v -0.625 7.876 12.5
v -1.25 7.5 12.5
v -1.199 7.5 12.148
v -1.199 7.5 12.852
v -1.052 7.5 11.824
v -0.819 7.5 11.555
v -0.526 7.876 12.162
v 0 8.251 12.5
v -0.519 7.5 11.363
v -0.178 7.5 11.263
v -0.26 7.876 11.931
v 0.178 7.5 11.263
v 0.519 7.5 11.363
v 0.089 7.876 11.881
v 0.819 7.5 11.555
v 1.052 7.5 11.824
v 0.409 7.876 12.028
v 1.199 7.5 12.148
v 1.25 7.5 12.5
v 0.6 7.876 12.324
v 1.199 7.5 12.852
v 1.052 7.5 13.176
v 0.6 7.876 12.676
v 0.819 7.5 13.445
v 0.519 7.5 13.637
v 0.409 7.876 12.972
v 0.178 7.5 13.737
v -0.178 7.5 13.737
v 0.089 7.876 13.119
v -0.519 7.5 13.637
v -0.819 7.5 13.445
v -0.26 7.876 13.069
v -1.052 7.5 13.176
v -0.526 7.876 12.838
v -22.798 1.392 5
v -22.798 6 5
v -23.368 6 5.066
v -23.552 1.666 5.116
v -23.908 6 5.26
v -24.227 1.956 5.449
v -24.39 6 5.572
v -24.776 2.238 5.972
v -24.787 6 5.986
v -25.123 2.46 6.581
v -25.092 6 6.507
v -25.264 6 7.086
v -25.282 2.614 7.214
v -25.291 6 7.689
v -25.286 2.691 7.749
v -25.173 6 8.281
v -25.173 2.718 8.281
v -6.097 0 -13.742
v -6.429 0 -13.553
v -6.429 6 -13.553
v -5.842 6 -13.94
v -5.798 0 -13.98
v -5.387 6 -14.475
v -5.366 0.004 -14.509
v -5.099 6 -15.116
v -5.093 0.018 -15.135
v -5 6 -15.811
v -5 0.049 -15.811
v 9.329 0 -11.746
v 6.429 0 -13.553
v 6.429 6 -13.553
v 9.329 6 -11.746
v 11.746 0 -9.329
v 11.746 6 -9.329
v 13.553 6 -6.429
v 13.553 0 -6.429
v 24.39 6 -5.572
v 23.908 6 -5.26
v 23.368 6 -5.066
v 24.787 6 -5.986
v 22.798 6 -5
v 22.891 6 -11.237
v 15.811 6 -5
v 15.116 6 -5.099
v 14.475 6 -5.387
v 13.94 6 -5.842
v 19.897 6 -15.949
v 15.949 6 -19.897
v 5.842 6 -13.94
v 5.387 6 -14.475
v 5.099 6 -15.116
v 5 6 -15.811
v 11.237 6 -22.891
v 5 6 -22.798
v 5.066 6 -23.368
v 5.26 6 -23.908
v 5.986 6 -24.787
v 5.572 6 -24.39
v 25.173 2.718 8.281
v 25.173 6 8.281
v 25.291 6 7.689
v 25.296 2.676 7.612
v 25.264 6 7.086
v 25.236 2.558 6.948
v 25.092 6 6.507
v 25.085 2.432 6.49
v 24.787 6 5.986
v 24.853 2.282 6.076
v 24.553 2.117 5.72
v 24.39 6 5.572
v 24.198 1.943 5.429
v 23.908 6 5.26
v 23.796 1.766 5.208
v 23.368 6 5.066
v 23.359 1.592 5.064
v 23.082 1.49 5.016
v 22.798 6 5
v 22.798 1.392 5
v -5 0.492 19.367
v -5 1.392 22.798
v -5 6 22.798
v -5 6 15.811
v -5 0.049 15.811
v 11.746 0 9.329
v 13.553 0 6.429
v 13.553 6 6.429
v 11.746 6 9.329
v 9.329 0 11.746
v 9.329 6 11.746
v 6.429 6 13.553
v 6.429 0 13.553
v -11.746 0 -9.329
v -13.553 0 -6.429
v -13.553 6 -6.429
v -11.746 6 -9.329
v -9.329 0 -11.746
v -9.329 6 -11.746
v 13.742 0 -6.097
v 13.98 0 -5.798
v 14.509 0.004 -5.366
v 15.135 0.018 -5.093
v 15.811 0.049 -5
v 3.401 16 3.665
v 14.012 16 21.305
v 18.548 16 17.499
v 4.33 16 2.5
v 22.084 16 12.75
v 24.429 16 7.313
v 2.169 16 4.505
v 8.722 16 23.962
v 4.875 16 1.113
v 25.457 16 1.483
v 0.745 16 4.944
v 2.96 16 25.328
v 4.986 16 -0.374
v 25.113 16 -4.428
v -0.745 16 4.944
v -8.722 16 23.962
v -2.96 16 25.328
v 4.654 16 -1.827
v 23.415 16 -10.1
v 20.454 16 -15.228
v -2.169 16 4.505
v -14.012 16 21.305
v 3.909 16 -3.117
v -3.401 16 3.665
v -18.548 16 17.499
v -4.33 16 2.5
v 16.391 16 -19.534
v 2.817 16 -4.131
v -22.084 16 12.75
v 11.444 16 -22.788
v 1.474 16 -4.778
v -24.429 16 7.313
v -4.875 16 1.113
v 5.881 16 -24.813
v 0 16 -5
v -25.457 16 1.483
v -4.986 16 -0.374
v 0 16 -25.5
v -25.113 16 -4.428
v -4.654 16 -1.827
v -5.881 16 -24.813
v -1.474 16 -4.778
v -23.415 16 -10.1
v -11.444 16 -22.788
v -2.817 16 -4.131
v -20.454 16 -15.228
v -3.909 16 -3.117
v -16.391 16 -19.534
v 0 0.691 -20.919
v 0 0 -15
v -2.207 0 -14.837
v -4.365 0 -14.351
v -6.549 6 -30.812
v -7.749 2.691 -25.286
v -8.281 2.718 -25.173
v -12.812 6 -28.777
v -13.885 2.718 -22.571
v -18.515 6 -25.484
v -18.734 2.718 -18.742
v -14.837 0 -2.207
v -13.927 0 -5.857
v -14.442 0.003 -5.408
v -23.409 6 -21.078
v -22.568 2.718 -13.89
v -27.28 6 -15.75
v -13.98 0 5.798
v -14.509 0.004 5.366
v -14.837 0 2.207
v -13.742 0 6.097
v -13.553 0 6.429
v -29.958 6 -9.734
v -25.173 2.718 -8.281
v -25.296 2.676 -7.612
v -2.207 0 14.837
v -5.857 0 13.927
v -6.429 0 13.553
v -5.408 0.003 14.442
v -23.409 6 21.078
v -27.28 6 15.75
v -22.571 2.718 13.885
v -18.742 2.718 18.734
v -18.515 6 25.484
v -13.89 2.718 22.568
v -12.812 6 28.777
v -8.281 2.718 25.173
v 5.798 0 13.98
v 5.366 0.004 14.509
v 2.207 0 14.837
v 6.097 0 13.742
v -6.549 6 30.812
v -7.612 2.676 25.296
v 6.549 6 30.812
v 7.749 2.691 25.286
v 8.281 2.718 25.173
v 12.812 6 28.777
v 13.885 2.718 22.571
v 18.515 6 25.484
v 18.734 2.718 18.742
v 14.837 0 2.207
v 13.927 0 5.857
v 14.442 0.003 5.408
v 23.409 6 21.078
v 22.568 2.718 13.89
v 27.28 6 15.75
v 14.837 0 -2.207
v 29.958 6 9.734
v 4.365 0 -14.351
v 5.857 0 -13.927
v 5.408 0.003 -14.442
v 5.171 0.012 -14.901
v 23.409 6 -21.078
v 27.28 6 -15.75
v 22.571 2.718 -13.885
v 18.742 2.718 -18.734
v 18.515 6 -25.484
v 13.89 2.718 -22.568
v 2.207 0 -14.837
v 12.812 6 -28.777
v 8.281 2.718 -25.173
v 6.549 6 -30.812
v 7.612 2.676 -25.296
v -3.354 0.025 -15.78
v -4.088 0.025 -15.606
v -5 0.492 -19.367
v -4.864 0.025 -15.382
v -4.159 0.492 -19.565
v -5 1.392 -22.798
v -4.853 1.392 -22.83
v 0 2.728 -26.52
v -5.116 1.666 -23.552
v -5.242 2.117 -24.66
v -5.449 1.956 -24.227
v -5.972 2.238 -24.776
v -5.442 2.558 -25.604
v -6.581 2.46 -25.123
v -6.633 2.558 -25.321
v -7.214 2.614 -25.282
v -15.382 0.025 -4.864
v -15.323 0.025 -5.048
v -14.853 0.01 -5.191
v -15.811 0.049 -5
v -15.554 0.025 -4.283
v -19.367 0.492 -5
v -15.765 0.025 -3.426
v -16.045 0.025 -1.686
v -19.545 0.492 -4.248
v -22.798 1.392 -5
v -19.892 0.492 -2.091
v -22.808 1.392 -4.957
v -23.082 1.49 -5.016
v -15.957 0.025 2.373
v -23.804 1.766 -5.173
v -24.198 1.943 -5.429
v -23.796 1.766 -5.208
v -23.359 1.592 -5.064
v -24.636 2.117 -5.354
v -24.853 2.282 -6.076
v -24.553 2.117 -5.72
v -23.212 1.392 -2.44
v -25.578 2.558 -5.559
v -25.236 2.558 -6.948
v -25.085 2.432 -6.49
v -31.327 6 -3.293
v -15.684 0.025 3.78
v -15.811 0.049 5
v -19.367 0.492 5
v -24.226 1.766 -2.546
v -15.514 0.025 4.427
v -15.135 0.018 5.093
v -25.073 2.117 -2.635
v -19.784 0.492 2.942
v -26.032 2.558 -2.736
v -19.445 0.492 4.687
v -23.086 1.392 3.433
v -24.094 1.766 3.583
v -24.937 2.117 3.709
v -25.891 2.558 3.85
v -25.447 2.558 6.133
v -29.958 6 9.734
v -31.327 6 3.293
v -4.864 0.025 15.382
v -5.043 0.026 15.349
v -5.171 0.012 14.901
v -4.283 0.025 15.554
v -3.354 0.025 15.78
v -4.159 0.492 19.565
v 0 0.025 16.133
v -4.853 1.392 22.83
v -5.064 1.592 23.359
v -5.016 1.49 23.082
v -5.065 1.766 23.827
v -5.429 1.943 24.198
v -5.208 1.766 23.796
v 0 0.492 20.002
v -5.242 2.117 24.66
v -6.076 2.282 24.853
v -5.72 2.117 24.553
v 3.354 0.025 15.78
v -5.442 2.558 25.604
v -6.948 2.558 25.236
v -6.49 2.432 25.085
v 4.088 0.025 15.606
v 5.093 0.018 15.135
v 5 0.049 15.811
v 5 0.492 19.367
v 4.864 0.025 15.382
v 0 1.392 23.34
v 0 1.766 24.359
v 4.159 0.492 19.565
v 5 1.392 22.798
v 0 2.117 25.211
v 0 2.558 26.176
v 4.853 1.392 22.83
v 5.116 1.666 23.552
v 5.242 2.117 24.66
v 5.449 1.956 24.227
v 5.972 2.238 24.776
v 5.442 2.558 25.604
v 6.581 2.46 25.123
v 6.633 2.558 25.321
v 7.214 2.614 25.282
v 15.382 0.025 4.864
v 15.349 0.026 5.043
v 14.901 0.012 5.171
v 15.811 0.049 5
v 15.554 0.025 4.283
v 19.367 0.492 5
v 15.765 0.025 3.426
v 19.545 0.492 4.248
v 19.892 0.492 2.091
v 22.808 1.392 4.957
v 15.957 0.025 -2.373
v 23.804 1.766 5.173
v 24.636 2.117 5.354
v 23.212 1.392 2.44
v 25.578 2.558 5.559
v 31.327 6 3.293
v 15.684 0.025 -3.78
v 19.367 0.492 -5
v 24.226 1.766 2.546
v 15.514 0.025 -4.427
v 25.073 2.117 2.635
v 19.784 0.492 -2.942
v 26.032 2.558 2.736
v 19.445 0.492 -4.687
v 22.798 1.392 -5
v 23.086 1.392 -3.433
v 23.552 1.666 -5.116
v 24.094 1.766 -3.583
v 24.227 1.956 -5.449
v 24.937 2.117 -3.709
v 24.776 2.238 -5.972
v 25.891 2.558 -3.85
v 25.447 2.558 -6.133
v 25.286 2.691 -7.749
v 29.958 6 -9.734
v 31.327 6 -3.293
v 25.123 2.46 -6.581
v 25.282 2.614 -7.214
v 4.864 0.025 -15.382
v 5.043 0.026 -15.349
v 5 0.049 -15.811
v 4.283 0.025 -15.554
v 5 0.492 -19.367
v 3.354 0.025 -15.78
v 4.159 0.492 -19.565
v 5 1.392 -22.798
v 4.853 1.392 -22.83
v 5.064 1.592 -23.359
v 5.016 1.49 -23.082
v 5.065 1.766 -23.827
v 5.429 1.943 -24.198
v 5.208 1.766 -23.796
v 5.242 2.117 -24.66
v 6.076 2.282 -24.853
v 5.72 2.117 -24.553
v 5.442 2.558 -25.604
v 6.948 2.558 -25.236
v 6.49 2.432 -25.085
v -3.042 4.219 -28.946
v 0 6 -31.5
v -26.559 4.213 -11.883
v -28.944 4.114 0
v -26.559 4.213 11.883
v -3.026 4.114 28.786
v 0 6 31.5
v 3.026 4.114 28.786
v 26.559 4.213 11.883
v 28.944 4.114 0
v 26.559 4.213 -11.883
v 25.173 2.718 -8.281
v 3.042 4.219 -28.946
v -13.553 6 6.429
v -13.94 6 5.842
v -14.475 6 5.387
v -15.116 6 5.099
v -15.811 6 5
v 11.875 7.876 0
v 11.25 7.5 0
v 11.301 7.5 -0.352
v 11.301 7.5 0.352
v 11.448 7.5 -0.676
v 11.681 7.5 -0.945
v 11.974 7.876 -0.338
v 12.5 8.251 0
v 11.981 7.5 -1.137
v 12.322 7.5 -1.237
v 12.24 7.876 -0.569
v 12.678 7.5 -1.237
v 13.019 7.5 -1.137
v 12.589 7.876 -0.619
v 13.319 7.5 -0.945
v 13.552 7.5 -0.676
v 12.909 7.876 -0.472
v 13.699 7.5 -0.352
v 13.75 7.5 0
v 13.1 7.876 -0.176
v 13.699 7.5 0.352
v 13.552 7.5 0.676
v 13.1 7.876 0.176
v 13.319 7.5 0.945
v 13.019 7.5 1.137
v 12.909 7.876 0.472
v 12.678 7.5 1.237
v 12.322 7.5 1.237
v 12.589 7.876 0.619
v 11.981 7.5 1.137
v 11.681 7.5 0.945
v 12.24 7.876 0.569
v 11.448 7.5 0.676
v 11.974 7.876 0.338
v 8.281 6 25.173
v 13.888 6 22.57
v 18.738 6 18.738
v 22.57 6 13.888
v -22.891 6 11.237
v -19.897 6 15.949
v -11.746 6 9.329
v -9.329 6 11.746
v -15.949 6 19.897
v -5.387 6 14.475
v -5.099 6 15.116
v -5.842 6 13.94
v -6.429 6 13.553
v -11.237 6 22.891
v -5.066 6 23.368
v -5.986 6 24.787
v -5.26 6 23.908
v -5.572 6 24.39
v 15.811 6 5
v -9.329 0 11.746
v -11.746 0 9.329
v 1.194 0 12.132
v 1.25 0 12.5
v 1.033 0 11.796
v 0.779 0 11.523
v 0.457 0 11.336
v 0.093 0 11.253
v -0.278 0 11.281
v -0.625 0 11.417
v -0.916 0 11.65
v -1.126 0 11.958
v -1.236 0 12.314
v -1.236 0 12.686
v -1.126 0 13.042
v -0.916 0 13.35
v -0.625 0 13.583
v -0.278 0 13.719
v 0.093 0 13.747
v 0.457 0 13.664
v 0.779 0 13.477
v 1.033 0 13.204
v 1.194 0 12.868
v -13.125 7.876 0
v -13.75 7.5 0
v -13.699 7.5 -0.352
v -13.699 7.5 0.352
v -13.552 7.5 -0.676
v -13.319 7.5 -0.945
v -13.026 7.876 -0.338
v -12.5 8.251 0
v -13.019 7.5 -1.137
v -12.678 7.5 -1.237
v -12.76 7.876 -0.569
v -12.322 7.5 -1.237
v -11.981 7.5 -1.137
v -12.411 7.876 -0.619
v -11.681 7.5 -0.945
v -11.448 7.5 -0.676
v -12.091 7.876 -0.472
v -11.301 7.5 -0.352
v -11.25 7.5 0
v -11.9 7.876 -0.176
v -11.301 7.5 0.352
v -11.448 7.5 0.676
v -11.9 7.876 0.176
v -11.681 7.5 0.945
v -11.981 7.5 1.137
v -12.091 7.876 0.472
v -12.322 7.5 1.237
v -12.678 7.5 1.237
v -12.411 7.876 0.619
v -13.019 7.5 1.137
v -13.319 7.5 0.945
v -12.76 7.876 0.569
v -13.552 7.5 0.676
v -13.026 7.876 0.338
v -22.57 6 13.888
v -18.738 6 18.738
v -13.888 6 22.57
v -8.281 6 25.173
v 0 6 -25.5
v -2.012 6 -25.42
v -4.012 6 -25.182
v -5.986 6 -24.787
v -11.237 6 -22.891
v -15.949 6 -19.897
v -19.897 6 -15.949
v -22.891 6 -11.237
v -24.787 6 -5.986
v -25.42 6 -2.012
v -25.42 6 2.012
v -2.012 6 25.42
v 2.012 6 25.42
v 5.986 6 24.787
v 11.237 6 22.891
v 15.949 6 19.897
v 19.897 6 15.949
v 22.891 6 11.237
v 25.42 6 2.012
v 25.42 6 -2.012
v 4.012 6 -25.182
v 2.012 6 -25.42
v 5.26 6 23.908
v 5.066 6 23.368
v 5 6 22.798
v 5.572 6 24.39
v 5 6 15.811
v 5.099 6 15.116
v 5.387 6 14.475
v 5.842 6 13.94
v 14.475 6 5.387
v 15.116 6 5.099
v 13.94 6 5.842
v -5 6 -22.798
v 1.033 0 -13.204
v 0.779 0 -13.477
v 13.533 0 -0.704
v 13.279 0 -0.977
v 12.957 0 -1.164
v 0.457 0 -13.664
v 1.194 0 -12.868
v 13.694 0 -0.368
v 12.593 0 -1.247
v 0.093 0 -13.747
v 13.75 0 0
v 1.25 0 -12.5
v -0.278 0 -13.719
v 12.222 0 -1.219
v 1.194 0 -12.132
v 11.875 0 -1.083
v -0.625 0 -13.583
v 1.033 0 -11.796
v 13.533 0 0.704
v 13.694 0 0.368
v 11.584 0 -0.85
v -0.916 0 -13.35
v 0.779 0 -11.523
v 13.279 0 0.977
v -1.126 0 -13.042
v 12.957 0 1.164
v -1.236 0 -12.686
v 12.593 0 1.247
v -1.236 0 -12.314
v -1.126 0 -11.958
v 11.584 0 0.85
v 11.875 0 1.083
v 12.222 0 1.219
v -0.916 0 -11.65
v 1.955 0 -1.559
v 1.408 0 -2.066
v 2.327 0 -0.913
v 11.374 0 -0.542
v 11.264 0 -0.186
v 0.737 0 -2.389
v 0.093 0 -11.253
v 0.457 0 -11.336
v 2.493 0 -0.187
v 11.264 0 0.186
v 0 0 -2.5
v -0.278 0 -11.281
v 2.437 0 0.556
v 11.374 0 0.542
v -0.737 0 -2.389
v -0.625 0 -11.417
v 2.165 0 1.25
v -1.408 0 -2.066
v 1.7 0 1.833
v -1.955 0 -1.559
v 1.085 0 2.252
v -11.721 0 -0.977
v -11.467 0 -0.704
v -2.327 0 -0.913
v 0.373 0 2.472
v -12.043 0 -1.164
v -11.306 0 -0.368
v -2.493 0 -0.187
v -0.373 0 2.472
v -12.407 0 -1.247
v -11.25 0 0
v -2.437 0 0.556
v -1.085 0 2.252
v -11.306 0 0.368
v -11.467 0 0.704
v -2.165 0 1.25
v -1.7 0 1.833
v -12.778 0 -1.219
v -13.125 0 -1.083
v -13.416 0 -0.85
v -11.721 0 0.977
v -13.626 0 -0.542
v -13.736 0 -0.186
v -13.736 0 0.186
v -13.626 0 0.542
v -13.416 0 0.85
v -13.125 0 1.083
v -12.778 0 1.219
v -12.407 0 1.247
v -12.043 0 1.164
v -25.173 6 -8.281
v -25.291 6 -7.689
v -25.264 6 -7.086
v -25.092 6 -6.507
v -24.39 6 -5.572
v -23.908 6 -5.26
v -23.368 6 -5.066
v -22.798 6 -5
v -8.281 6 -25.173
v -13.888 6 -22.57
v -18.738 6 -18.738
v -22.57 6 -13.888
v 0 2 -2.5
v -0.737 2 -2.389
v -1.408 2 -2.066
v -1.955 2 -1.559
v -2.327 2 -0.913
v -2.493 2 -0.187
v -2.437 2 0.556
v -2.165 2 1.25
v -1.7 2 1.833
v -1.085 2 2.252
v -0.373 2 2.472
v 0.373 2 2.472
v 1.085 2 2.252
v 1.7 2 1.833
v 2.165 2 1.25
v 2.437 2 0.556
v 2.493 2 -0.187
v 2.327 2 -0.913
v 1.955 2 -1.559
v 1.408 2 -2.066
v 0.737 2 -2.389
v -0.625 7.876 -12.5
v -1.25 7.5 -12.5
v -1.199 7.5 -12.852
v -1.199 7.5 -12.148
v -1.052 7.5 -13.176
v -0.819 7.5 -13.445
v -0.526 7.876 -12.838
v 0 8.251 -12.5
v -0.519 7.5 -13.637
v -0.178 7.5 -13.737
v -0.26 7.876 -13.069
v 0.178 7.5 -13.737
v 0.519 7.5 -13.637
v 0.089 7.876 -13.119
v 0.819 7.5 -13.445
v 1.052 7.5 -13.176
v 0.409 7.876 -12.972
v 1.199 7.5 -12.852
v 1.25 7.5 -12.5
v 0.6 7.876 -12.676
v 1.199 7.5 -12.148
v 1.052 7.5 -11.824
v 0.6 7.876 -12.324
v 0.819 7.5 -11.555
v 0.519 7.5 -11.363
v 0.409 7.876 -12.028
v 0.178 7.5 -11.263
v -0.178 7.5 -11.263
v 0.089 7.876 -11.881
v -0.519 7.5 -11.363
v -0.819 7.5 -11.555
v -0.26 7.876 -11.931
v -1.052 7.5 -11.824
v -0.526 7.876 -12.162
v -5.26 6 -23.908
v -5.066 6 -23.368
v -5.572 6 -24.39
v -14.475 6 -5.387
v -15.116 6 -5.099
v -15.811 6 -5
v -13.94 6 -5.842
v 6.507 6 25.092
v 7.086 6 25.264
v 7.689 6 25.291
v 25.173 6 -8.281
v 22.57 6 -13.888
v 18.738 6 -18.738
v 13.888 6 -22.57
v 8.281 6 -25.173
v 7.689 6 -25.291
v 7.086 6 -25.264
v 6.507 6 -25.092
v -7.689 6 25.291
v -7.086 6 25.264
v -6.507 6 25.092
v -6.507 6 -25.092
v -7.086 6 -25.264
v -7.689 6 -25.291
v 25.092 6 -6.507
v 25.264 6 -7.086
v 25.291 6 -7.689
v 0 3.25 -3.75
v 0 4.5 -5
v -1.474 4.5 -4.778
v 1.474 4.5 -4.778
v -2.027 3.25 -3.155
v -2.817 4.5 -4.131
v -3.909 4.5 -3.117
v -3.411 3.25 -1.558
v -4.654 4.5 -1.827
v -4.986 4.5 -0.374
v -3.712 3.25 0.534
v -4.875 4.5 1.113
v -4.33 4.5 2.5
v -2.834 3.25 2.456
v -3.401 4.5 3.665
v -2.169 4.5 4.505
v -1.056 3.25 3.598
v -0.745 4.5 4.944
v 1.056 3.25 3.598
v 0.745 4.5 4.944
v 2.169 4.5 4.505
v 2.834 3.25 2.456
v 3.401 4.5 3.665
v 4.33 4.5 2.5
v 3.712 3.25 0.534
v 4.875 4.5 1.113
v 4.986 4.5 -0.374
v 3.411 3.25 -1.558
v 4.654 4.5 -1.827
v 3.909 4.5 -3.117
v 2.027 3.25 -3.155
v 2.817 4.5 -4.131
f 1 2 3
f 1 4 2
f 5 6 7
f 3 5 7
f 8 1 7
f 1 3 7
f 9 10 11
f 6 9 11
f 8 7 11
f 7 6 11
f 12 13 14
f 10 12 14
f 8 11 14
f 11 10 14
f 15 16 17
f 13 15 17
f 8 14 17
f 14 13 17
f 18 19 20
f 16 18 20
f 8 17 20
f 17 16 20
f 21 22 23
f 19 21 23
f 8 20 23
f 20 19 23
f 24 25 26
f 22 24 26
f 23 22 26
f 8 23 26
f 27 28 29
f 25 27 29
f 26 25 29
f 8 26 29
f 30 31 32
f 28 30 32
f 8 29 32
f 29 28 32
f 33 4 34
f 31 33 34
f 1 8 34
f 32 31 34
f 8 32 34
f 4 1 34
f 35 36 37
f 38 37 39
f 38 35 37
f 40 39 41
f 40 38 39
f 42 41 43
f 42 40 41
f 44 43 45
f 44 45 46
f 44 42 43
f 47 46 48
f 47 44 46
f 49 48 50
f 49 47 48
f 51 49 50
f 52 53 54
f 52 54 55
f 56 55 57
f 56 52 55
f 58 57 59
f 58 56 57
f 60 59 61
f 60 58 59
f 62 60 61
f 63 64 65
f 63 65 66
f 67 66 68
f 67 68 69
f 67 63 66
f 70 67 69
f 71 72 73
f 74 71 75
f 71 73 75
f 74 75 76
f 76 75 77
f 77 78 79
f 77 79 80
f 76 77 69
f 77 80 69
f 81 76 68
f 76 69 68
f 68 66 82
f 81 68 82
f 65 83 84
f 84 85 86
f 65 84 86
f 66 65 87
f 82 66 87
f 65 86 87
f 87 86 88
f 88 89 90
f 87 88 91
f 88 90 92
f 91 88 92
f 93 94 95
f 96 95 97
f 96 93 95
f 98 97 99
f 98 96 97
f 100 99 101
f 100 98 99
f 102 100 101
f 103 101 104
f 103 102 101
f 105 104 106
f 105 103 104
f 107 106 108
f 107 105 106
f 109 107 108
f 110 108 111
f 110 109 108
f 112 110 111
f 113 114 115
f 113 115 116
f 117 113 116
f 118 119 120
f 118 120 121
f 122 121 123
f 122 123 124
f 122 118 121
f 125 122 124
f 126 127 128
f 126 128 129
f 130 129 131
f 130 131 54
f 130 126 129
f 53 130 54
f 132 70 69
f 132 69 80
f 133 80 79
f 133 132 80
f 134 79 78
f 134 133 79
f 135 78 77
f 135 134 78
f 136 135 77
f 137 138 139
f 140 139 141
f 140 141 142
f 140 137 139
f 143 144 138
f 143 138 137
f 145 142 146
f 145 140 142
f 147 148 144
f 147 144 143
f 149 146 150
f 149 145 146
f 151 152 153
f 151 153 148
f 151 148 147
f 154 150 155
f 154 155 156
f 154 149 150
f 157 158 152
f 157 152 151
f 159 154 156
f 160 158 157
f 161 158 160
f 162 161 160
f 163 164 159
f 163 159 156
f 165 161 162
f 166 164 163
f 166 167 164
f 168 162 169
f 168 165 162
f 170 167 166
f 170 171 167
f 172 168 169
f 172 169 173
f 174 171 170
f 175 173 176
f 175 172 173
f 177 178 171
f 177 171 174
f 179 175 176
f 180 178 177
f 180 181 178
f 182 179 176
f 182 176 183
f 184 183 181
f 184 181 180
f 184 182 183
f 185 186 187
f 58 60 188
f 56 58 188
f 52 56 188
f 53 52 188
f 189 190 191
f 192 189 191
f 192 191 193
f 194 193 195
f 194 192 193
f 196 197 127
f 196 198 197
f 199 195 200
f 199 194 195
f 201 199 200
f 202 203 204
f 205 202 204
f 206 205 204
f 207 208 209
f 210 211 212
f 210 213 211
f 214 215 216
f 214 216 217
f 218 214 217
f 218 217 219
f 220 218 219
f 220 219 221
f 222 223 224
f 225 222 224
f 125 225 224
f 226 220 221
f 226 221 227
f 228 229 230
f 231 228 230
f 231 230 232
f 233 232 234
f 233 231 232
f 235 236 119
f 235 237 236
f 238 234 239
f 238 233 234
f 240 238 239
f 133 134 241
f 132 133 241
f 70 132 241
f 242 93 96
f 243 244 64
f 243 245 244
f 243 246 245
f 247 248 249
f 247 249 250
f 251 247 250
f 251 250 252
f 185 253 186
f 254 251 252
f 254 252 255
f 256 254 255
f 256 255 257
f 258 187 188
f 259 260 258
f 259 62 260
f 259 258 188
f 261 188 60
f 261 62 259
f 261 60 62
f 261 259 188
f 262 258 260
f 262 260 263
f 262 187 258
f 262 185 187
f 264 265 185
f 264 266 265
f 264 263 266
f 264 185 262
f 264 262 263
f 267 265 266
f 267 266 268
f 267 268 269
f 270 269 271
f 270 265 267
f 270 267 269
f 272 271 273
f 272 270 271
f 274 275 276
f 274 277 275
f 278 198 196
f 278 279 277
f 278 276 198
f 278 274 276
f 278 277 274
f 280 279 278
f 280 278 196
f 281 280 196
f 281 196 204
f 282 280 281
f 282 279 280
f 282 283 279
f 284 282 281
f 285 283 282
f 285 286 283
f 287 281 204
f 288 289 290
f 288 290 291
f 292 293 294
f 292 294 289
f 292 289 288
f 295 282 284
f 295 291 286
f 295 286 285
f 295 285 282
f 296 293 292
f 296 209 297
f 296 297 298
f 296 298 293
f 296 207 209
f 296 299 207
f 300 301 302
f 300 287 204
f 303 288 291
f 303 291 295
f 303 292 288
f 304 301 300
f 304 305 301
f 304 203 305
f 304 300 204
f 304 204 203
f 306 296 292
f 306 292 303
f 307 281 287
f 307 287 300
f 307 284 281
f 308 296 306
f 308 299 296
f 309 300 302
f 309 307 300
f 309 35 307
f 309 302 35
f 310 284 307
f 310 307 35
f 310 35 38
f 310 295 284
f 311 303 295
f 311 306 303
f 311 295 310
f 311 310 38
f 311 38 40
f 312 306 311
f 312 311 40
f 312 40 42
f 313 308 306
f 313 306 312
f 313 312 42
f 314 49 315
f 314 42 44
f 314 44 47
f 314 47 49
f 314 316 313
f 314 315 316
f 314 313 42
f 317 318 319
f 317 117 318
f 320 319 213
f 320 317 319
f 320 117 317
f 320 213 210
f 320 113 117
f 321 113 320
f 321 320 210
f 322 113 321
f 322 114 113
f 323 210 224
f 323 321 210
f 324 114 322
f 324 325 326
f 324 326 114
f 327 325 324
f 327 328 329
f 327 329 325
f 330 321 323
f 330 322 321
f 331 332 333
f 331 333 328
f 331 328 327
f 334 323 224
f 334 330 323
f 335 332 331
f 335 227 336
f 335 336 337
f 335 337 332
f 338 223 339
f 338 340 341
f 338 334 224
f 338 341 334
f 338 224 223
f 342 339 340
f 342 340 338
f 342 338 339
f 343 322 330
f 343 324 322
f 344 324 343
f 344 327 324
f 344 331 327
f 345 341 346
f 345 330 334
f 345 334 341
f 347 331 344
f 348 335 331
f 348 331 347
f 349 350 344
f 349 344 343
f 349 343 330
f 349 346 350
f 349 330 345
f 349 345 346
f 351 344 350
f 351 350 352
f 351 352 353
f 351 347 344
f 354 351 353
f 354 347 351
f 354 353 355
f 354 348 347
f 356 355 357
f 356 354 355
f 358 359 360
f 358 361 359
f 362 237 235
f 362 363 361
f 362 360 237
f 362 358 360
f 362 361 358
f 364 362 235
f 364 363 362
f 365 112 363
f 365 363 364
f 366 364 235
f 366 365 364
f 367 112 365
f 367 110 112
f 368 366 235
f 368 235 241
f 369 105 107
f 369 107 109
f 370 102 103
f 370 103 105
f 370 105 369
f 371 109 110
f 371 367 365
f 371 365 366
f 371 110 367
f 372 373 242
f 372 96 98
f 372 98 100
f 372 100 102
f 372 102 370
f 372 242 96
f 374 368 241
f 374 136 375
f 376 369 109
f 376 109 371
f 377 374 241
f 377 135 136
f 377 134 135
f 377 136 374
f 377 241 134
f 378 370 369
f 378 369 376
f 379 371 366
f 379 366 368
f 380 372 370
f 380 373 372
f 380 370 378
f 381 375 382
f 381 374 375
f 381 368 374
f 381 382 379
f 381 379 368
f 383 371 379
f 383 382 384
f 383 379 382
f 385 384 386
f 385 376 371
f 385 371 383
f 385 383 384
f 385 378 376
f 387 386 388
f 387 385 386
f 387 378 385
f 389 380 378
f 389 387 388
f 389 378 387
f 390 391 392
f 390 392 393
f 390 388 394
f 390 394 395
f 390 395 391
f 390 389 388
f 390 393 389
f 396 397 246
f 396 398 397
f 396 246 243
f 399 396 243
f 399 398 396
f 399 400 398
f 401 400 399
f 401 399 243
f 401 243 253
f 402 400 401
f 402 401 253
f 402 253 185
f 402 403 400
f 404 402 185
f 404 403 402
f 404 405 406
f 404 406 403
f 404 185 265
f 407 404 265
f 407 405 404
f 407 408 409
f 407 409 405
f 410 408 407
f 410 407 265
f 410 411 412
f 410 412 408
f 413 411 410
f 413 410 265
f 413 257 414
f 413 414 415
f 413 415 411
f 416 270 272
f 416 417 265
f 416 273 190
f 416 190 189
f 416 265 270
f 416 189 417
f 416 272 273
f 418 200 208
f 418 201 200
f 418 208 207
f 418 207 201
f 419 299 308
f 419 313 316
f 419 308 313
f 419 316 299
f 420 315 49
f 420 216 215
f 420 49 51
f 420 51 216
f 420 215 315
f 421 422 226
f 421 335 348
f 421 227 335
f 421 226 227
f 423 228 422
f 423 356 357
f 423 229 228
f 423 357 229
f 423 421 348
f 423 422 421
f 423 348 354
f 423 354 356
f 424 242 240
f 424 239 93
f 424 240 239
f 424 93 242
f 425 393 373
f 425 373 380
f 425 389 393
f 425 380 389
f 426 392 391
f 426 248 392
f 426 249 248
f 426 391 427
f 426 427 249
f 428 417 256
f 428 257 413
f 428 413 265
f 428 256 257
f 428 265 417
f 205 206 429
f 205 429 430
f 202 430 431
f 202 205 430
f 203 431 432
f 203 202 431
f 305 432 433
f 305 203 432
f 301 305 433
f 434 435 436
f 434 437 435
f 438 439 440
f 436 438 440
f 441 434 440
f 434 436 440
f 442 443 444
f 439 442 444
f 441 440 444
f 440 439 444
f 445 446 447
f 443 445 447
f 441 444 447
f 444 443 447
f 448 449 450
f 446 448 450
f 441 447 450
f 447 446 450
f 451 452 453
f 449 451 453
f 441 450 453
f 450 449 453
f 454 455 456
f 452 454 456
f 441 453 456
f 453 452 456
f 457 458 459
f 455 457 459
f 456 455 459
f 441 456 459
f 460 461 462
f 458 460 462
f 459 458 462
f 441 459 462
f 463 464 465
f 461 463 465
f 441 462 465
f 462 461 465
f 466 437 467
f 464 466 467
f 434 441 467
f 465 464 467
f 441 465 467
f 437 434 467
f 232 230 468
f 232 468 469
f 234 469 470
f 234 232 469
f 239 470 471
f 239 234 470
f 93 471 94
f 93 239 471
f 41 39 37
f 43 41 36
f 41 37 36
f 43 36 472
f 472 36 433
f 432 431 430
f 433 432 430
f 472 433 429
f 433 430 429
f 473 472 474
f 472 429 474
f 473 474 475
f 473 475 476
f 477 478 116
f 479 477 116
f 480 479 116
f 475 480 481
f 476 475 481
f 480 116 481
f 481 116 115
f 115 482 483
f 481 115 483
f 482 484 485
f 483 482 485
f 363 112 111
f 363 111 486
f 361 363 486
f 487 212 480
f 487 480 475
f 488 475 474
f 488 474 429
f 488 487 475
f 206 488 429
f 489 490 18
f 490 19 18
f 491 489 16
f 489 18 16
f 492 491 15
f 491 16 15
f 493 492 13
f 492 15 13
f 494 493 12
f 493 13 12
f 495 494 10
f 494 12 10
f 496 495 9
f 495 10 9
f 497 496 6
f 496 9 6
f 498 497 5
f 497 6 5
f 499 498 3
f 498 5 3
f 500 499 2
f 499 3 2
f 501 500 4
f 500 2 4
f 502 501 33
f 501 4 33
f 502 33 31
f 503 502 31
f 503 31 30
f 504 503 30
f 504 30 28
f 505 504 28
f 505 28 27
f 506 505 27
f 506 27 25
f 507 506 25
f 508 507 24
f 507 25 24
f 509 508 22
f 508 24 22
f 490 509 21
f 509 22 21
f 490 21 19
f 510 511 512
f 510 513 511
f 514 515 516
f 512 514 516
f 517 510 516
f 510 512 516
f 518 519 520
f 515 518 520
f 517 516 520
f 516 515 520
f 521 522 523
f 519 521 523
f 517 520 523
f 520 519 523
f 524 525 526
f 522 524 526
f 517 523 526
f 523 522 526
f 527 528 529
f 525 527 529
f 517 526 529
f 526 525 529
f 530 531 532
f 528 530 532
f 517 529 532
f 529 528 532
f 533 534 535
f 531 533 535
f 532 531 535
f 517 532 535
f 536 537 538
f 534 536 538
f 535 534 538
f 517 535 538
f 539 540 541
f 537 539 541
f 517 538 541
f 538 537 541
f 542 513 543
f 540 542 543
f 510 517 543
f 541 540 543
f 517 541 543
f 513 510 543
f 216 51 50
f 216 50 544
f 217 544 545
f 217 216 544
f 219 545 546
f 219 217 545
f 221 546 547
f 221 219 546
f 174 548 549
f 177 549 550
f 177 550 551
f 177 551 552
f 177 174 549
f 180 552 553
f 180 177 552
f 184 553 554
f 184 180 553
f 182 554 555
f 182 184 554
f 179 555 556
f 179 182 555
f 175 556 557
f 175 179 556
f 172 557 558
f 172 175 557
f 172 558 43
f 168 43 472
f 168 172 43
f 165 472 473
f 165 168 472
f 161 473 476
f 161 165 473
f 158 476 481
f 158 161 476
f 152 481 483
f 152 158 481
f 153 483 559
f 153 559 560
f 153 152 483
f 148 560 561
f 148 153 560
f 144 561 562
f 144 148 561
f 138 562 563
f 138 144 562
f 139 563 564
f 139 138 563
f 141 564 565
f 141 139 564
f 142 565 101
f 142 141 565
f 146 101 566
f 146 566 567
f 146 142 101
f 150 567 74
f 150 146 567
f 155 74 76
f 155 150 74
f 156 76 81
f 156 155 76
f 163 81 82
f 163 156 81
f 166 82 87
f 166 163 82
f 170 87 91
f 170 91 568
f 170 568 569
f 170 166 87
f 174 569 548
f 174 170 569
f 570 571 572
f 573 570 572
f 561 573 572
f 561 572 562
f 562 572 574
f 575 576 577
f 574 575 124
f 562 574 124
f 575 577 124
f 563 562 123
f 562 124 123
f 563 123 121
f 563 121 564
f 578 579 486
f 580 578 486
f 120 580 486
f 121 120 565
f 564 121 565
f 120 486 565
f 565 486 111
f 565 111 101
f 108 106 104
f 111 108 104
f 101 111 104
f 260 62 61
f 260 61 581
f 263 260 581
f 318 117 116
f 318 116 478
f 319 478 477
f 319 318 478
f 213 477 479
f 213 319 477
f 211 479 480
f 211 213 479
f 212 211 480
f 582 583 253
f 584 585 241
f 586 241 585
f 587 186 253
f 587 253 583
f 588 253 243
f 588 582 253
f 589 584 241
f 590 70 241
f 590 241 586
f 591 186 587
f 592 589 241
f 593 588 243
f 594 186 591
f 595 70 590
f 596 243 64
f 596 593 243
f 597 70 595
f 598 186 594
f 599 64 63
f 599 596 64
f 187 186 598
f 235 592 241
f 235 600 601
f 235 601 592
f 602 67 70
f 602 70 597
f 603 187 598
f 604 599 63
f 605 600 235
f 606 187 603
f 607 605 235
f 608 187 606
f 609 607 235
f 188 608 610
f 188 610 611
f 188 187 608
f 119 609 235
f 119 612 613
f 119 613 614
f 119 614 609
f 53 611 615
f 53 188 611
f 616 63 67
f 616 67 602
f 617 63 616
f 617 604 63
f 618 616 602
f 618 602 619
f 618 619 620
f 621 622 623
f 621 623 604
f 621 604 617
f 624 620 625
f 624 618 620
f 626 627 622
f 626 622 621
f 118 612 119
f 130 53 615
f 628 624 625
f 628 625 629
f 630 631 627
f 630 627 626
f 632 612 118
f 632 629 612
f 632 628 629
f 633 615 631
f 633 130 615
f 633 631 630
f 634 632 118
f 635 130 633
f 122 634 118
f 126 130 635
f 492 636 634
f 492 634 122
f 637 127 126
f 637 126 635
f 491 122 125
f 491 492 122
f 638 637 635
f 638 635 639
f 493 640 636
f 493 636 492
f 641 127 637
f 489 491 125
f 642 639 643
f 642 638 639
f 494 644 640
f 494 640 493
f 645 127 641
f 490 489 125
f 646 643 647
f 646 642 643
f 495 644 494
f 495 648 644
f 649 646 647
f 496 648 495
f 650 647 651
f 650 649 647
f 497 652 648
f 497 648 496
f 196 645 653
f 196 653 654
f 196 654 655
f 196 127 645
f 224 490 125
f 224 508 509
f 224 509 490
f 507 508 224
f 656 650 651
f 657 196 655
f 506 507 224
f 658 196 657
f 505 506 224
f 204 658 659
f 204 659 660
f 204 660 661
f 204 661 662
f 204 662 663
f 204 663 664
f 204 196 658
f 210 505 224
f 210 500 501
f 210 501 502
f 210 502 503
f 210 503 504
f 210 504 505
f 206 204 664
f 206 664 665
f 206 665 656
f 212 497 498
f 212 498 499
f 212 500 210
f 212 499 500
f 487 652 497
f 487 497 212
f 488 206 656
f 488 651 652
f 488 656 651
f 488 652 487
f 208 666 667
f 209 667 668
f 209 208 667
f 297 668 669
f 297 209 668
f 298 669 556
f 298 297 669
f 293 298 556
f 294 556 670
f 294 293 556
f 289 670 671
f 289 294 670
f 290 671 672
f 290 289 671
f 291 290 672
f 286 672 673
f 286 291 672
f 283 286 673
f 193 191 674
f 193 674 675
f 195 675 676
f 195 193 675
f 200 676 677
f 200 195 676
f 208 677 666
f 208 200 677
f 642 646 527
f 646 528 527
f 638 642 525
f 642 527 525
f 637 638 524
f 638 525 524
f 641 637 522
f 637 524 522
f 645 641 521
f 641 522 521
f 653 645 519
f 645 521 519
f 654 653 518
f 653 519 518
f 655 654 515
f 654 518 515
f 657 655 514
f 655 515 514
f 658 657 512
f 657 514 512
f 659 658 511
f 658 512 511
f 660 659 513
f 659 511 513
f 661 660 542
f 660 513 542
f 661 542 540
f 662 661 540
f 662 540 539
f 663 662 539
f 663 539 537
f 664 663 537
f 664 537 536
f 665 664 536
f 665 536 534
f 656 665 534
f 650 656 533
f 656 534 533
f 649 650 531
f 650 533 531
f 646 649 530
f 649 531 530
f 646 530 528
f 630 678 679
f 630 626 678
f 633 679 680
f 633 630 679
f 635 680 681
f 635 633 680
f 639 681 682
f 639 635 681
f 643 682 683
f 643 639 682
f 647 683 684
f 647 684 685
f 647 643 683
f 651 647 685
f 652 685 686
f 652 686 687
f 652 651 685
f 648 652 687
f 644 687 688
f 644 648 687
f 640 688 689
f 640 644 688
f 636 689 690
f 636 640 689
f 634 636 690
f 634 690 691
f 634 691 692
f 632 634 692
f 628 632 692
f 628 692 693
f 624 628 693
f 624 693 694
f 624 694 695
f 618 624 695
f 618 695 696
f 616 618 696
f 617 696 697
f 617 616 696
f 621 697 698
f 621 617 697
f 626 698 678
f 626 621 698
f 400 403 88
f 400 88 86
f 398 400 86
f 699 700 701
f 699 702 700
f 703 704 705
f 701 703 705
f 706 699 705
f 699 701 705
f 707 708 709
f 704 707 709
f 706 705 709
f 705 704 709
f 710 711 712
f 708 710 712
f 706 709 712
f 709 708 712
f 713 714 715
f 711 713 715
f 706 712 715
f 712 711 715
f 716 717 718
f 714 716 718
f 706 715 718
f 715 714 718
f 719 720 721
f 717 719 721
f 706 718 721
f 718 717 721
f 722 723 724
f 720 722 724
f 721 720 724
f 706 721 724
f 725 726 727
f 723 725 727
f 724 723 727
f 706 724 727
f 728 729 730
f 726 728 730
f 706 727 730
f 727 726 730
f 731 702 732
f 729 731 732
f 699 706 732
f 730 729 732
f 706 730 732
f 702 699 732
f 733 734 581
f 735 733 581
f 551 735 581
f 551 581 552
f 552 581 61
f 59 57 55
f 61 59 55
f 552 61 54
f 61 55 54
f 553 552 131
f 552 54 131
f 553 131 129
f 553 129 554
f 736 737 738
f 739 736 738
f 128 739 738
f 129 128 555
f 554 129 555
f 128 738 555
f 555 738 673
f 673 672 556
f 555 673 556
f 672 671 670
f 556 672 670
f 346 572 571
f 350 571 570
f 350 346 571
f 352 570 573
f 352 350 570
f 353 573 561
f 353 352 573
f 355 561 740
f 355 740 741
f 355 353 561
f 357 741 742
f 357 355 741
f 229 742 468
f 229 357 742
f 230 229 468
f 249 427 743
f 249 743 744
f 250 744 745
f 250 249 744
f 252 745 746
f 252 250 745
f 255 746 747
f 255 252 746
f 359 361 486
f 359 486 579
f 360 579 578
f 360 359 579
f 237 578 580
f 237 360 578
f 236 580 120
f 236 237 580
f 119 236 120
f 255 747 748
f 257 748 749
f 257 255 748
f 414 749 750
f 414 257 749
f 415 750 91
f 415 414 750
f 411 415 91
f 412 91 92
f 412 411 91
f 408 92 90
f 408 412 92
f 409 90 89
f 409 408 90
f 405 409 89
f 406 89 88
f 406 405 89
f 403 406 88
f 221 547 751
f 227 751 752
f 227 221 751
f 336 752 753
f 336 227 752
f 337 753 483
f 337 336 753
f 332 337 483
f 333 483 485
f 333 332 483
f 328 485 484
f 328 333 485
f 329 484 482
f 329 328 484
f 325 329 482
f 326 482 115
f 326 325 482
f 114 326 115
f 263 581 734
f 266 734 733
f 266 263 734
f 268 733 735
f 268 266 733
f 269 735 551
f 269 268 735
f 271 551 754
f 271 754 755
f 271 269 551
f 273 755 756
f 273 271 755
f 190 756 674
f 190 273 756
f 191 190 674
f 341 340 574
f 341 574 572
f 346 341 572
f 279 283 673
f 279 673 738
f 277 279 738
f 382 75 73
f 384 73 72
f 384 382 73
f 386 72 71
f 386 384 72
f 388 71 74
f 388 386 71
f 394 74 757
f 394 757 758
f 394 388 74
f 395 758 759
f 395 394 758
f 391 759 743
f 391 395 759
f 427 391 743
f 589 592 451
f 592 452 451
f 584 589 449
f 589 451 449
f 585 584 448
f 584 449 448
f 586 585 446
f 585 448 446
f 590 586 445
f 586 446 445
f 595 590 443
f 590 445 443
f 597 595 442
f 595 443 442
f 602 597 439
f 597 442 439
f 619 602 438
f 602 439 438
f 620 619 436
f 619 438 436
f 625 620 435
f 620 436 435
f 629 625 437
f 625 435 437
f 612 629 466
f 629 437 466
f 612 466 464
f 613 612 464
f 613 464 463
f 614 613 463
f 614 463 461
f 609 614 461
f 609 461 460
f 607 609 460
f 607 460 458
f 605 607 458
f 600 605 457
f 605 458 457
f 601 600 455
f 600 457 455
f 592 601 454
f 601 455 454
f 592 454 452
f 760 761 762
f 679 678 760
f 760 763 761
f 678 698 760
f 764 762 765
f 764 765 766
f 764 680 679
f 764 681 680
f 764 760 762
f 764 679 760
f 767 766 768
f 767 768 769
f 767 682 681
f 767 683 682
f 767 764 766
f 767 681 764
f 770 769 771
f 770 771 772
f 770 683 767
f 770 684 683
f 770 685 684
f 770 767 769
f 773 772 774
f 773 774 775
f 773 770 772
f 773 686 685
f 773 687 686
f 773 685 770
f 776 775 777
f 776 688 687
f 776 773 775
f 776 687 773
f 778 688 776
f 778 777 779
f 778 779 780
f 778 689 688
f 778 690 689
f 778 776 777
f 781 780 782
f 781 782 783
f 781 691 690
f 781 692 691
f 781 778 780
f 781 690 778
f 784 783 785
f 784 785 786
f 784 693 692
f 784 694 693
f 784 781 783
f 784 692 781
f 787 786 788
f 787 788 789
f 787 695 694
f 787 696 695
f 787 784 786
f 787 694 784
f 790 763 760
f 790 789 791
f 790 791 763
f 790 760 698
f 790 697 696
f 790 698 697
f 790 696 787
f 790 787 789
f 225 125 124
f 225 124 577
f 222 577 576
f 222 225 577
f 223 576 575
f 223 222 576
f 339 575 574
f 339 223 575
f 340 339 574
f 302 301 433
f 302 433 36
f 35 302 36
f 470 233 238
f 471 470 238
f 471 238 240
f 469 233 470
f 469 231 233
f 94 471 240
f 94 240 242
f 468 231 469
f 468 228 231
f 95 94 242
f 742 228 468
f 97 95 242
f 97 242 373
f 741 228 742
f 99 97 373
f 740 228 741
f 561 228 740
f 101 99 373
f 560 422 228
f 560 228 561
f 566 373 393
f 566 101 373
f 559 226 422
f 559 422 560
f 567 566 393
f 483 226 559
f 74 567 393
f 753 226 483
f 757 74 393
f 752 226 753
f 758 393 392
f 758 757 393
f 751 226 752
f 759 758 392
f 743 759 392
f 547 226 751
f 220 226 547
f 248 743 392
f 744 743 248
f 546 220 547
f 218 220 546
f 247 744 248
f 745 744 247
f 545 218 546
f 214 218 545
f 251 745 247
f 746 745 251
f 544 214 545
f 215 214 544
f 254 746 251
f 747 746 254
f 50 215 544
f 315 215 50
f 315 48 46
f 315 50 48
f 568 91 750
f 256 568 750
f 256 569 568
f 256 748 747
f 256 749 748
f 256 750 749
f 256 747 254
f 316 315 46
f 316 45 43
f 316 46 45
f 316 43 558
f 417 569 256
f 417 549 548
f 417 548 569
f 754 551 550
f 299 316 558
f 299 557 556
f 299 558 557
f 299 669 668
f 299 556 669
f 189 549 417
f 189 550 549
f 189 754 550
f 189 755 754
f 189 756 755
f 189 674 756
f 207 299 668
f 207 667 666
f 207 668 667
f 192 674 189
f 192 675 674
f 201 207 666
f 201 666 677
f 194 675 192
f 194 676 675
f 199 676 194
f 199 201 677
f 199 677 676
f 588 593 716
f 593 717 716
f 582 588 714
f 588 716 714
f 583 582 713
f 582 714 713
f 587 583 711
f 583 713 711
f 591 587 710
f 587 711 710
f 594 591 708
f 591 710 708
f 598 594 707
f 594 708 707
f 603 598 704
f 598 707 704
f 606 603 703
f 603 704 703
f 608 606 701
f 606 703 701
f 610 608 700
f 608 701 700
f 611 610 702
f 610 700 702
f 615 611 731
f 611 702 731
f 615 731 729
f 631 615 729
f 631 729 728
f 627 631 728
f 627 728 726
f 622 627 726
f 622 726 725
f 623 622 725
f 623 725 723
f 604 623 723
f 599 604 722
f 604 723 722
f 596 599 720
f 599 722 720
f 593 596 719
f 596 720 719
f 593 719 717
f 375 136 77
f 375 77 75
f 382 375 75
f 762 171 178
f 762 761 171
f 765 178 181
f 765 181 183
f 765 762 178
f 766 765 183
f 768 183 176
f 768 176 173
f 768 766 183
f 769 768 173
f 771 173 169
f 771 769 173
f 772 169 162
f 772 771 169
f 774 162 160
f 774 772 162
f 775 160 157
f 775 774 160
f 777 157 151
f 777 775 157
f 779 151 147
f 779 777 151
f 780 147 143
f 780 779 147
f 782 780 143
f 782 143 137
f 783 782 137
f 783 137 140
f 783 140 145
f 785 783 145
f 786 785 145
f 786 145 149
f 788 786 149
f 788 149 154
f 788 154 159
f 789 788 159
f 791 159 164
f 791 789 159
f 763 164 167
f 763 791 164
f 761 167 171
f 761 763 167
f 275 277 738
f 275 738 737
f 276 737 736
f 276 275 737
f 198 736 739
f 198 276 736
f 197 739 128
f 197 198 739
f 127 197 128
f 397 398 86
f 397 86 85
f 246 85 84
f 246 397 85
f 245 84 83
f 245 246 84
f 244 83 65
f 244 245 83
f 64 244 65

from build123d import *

# Parameters (mm, degrees)
M3X0_5_TAPPED_HOLE1_D     = 2.5
M3X0_5_TAPPED_HOLE1_DEPTH = 7.5
M3X0_5_TAPPED_HOLE1_TIP   = 0.751075774
CUT_EXTRUDE1_DEPTH        = 6
CIRPATTERN1_COUNT         = 4


with BuildPart() as part:
    # Sketch1 → Revolve1 (revolve)
    with BuildSketch(Plane.XY, mode=Mode.PRIVATE) as revolve1_sk:
        with BuildLine():
            Line((-2.5, 2), (-2.5, 0))
            Line((-2.5, 0), (-15, 0))
            ThreePointArc((-15, 0), (-23.778524933, 1.546556434), (-31.5, 6))
            Line((-31.5, 6), (-25.5, 6))
            Line((-25.5, 6), (-25.5, 16))
            Line((-25.5, 16), (-5, 16))
            Line((-5, 16), (-5, 4.5))
            Line((-5, 4.5), (-2.5, 2))
        make_face()
    revolve(revolve1_sk.sketch.rotate(Axis((0, 0, 0), (0, 1, 0)), 270), axis=Axis((0, 0, 0), (0, 1, 0)))

    # M3x0.5 Tapped Hole1
    with Locations(Plane(origin=(0, 0, 0), x_dir=(-1, 0, 0), z_dir=(0, -1, 0))):
        with Locations((12.5, 0), (-12.5, 0), (0, 12.5), (0, -12.5)):
            Hole(M3X0_5_TAPPED_HOLE1_D / 2, depth=M3X0_5_TAPPED_HOLE1_DEPTH)
            with Locations((0, 0, -(M3X0_5_TAPPED_HOLE1_DEPTH + M3X0_5_TAPPED_HOLE1_TIP / 2))):  # 118° drill point
                Cone(0, M3X0_5_TAPPED_HOLE1_D / 2, M3X0_5_TAPPED_HOLE1_TIP, mode=Mode.SUBTRACT)

    # Sketch4 → Cut-Extrude1 (cut)
    with BuildSketch(Plane.XZ):
        with BuildLine():
            Line((-5, -15.811388301), (-5, -22.79802623))
            ThreePointArc((-5, -22.79802623), (-6.034245075, -24.823257699), (-8.28125, -25.172820629))
            ThreePointArc((-8.28125, -25.172820629), (-18.738329701, -18.738329701), (-25.172820629, -8.28125))
            ThreePointArc((-25.172820629, -8.28125), (-24.823257699, -6.034245075), (-22.79802623, -5))
            Line((-22.79802623, -5), (-15.811388301, -5))
            ThreePointArc((-15.811388301, -5), (-14.475082091, -5.387114363), (-13.552618544, -6.428571429))
            ThreePointArc((-13.552618544, -6.428571429), (-10.606601718, -10.606601718), (-6.428571429, -13.552618544))
            ThreePointArc((-6.428571429, -13.552618544), (-5.387114363, -14.475082091), (-5, -15.811388301))
        make_face()
    cut_extrude1 = extrude(amount=-CUT_EXTRUDE1_DEPTH, mode=Mode.SUBTRACT)

    # CirPattern1: Cut-Extrude1 ×4 about axis
    cirpattern1_axis = Axis((0, 0, 0), (0, 1, 0))
    for i in range(1, CIRPATTERN1_COUNT):
        add(cut_extrude1.rotate(cirpattern1_axis, i * 360 / CIRPATTERN1_COUNT), mode=Mode.SUBTRACT)


solid = part.part
